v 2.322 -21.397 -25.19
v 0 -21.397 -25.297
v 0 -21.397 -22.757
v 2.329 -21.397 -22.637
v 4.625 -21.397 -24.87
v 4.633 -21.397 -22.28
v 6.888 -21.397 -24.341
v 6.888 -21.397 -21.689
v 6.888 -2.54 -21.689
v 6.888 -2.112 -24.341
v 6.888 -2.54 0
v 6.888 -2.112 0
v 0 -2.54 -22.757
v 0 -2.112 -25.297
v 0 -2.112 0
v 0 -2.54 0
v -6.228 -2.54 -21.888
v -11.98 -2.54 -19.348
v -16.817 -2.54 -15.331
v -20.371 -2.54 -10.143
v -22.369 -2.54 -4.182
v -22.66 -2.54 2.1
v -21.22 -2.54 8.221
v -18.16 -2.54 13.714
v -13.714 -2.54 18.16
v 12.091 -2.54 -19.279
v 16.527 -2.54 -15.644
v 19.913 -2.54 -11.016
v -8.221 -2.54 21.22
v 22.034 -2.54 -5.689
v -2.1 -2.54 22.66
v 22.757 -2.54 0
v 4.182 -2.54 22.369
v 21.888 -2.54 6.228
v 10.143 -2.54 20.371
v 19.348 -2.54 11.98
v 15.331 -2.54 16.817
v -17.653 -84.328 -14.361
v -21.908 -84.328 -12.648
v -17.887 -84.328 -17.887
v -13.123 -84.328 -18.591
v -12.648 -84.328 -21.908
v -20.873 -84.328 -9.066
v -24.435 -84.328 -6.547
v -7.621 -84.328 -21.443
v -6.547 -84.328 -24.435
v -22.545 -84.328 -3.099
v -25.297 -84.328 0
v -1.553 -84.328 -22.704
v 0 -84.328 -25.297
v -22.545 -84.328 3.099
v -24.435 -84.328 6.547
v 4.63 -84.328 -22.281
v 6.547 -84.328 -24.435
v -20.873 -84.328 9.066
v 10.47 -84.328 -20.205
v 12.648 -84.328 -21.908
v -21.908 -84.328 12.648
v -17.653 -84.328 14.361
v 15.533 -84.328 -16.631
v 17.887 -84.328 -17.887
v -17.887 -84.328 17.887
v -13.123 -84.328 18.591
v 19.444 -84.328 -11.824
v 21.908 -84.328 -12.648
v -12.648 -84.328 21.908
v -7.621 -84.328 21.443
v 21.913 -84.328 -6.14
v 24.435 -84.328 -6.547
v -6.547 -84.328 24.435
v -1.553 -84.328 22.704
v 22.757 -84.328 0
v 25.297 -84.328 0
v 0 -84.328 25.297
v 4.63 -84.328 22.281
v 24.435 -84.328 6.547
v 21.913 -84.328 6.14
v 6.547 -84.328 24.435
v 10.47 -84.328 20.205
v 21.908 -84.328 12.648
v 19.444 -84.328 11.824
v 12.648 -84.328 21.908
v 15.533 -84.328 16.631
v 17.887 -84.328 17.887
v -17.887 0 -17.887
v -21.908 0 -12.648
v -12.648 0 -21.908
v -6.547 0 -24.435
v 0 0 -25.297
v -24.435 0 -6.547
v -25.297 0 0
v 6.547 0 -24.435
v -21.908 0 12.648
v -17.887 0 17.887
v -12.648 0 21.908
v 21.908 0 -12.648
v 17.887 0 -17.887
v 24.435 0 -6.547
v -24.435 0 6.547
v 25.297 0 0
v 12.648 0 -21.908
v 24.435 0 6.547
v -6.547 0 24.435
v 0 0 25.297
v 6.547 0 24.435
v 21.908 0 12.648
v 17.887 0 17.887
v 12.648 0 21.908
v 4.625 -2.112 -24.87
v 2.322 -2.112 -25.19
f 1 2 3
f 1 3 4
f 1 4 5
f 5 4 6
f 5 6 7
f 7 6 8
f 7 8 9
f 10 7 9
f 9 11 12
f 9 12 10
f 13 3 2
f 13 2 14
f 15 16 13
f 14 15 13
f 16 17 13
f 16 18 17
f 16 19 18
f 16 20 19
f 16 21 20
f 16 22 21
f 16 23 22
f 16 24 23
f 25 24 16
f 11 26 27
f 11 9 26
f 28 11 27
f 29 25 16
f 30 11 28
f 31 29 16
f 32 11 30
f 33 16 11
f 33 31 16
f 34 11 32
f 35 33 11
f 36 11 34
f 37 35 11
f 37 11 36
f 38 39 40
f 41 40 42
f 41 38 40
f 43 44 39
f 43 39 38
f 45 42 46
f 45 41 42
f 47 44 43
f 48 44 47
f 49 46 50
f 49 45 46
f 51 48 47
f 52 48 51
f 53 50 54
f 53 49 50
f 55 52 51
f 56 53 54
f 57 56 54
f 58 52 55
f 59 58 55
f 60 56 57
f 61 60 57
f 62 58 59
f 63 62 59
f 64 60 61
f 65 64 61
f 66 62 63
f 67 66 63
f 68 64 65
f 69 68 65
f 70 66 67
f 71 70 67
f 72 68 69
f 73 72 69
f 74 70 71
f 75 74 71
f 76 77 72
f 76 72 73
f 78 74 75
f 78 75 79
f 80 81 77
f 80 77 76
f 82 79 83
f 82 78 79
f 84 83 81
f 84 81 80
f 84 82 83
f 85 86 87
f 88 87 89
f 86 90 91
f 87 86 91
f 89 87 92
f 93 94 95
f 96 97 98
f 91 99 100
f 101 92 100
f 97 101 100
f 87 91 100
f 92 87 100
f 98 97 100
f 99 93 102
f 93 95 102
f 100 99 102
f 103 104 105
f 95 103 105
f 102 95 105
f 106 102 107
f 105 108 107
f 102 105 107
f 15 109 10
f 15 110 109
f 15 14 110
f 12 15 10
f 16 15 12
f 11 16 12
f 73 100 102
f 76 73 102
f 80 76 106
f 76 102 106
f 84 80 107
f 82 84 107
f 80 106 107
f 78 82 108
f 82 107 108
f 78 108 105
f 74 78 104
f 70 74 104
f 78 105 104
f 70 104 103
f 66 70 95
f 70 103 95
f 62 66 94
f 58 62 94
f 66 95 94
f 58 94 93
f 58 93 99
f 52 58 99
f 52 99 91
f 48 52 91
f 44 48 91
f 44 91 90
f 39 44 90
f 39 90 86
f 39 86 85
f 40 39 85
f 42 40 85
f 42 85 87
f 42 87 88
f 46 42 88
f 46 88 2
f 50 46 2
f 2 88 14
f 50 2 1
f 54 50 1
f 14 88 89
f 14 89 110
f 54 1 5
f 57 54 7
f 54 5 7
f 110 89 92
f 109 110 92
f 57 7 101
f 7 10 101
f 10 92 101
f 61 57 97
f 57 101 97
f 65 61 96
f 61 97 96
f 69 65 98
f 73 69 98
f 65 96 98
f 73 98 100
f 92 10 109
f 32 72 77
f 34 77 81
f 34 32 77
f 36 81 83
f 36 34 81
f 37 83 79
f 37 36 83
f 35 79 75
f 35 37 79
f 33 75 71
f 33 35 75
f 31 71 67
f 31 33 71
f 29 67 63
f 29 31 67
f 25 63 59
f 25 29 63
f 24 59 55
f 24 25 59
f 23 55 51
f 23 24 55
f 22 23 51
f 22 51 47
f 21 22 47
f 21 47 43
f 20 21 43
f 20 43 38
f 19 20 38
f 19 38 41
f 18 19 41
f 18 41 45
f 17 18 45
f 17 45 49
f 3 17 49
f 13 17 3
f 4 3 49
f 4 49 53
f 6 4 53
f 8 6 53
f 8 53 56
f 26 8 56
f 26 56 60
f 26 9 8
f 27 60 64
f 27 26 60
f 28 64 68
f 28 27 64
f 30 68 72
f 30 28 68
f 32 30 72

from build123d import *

# Parameters (mm, degrees)
F0_R     = 25.296615
F1_DEPTH = 84.328
F2_T     = -2.54
F3_W     = 6.888267
F3_H     = 19.285627
F4_DEPTH = 25.4


with BuildPart() as f1:
    # F0 (on Front) → F1 (new body)
    with BuildSketch(Plane.XZ):
        Circle(F0_R)
    extrude(amount=F1_DEPTH)

    # F2
    f2_openings = [f1.faces().sort_by_distance(p)[0] for p in [
        (0, -84.328, 0),
    ]]
    offset(amount=F2_T, openings=f2_openings)

    # F3 (on Top) → F4 (cut)
    with BuildSketch(Plane.XY):
        with Locations((3.444133, -11.754679)):
            Rectangle(F3_W, F3_H)
    extrude(amount=-F4_DEPTH, mode=Mode.SUBTRACT)


solid = f1.part
